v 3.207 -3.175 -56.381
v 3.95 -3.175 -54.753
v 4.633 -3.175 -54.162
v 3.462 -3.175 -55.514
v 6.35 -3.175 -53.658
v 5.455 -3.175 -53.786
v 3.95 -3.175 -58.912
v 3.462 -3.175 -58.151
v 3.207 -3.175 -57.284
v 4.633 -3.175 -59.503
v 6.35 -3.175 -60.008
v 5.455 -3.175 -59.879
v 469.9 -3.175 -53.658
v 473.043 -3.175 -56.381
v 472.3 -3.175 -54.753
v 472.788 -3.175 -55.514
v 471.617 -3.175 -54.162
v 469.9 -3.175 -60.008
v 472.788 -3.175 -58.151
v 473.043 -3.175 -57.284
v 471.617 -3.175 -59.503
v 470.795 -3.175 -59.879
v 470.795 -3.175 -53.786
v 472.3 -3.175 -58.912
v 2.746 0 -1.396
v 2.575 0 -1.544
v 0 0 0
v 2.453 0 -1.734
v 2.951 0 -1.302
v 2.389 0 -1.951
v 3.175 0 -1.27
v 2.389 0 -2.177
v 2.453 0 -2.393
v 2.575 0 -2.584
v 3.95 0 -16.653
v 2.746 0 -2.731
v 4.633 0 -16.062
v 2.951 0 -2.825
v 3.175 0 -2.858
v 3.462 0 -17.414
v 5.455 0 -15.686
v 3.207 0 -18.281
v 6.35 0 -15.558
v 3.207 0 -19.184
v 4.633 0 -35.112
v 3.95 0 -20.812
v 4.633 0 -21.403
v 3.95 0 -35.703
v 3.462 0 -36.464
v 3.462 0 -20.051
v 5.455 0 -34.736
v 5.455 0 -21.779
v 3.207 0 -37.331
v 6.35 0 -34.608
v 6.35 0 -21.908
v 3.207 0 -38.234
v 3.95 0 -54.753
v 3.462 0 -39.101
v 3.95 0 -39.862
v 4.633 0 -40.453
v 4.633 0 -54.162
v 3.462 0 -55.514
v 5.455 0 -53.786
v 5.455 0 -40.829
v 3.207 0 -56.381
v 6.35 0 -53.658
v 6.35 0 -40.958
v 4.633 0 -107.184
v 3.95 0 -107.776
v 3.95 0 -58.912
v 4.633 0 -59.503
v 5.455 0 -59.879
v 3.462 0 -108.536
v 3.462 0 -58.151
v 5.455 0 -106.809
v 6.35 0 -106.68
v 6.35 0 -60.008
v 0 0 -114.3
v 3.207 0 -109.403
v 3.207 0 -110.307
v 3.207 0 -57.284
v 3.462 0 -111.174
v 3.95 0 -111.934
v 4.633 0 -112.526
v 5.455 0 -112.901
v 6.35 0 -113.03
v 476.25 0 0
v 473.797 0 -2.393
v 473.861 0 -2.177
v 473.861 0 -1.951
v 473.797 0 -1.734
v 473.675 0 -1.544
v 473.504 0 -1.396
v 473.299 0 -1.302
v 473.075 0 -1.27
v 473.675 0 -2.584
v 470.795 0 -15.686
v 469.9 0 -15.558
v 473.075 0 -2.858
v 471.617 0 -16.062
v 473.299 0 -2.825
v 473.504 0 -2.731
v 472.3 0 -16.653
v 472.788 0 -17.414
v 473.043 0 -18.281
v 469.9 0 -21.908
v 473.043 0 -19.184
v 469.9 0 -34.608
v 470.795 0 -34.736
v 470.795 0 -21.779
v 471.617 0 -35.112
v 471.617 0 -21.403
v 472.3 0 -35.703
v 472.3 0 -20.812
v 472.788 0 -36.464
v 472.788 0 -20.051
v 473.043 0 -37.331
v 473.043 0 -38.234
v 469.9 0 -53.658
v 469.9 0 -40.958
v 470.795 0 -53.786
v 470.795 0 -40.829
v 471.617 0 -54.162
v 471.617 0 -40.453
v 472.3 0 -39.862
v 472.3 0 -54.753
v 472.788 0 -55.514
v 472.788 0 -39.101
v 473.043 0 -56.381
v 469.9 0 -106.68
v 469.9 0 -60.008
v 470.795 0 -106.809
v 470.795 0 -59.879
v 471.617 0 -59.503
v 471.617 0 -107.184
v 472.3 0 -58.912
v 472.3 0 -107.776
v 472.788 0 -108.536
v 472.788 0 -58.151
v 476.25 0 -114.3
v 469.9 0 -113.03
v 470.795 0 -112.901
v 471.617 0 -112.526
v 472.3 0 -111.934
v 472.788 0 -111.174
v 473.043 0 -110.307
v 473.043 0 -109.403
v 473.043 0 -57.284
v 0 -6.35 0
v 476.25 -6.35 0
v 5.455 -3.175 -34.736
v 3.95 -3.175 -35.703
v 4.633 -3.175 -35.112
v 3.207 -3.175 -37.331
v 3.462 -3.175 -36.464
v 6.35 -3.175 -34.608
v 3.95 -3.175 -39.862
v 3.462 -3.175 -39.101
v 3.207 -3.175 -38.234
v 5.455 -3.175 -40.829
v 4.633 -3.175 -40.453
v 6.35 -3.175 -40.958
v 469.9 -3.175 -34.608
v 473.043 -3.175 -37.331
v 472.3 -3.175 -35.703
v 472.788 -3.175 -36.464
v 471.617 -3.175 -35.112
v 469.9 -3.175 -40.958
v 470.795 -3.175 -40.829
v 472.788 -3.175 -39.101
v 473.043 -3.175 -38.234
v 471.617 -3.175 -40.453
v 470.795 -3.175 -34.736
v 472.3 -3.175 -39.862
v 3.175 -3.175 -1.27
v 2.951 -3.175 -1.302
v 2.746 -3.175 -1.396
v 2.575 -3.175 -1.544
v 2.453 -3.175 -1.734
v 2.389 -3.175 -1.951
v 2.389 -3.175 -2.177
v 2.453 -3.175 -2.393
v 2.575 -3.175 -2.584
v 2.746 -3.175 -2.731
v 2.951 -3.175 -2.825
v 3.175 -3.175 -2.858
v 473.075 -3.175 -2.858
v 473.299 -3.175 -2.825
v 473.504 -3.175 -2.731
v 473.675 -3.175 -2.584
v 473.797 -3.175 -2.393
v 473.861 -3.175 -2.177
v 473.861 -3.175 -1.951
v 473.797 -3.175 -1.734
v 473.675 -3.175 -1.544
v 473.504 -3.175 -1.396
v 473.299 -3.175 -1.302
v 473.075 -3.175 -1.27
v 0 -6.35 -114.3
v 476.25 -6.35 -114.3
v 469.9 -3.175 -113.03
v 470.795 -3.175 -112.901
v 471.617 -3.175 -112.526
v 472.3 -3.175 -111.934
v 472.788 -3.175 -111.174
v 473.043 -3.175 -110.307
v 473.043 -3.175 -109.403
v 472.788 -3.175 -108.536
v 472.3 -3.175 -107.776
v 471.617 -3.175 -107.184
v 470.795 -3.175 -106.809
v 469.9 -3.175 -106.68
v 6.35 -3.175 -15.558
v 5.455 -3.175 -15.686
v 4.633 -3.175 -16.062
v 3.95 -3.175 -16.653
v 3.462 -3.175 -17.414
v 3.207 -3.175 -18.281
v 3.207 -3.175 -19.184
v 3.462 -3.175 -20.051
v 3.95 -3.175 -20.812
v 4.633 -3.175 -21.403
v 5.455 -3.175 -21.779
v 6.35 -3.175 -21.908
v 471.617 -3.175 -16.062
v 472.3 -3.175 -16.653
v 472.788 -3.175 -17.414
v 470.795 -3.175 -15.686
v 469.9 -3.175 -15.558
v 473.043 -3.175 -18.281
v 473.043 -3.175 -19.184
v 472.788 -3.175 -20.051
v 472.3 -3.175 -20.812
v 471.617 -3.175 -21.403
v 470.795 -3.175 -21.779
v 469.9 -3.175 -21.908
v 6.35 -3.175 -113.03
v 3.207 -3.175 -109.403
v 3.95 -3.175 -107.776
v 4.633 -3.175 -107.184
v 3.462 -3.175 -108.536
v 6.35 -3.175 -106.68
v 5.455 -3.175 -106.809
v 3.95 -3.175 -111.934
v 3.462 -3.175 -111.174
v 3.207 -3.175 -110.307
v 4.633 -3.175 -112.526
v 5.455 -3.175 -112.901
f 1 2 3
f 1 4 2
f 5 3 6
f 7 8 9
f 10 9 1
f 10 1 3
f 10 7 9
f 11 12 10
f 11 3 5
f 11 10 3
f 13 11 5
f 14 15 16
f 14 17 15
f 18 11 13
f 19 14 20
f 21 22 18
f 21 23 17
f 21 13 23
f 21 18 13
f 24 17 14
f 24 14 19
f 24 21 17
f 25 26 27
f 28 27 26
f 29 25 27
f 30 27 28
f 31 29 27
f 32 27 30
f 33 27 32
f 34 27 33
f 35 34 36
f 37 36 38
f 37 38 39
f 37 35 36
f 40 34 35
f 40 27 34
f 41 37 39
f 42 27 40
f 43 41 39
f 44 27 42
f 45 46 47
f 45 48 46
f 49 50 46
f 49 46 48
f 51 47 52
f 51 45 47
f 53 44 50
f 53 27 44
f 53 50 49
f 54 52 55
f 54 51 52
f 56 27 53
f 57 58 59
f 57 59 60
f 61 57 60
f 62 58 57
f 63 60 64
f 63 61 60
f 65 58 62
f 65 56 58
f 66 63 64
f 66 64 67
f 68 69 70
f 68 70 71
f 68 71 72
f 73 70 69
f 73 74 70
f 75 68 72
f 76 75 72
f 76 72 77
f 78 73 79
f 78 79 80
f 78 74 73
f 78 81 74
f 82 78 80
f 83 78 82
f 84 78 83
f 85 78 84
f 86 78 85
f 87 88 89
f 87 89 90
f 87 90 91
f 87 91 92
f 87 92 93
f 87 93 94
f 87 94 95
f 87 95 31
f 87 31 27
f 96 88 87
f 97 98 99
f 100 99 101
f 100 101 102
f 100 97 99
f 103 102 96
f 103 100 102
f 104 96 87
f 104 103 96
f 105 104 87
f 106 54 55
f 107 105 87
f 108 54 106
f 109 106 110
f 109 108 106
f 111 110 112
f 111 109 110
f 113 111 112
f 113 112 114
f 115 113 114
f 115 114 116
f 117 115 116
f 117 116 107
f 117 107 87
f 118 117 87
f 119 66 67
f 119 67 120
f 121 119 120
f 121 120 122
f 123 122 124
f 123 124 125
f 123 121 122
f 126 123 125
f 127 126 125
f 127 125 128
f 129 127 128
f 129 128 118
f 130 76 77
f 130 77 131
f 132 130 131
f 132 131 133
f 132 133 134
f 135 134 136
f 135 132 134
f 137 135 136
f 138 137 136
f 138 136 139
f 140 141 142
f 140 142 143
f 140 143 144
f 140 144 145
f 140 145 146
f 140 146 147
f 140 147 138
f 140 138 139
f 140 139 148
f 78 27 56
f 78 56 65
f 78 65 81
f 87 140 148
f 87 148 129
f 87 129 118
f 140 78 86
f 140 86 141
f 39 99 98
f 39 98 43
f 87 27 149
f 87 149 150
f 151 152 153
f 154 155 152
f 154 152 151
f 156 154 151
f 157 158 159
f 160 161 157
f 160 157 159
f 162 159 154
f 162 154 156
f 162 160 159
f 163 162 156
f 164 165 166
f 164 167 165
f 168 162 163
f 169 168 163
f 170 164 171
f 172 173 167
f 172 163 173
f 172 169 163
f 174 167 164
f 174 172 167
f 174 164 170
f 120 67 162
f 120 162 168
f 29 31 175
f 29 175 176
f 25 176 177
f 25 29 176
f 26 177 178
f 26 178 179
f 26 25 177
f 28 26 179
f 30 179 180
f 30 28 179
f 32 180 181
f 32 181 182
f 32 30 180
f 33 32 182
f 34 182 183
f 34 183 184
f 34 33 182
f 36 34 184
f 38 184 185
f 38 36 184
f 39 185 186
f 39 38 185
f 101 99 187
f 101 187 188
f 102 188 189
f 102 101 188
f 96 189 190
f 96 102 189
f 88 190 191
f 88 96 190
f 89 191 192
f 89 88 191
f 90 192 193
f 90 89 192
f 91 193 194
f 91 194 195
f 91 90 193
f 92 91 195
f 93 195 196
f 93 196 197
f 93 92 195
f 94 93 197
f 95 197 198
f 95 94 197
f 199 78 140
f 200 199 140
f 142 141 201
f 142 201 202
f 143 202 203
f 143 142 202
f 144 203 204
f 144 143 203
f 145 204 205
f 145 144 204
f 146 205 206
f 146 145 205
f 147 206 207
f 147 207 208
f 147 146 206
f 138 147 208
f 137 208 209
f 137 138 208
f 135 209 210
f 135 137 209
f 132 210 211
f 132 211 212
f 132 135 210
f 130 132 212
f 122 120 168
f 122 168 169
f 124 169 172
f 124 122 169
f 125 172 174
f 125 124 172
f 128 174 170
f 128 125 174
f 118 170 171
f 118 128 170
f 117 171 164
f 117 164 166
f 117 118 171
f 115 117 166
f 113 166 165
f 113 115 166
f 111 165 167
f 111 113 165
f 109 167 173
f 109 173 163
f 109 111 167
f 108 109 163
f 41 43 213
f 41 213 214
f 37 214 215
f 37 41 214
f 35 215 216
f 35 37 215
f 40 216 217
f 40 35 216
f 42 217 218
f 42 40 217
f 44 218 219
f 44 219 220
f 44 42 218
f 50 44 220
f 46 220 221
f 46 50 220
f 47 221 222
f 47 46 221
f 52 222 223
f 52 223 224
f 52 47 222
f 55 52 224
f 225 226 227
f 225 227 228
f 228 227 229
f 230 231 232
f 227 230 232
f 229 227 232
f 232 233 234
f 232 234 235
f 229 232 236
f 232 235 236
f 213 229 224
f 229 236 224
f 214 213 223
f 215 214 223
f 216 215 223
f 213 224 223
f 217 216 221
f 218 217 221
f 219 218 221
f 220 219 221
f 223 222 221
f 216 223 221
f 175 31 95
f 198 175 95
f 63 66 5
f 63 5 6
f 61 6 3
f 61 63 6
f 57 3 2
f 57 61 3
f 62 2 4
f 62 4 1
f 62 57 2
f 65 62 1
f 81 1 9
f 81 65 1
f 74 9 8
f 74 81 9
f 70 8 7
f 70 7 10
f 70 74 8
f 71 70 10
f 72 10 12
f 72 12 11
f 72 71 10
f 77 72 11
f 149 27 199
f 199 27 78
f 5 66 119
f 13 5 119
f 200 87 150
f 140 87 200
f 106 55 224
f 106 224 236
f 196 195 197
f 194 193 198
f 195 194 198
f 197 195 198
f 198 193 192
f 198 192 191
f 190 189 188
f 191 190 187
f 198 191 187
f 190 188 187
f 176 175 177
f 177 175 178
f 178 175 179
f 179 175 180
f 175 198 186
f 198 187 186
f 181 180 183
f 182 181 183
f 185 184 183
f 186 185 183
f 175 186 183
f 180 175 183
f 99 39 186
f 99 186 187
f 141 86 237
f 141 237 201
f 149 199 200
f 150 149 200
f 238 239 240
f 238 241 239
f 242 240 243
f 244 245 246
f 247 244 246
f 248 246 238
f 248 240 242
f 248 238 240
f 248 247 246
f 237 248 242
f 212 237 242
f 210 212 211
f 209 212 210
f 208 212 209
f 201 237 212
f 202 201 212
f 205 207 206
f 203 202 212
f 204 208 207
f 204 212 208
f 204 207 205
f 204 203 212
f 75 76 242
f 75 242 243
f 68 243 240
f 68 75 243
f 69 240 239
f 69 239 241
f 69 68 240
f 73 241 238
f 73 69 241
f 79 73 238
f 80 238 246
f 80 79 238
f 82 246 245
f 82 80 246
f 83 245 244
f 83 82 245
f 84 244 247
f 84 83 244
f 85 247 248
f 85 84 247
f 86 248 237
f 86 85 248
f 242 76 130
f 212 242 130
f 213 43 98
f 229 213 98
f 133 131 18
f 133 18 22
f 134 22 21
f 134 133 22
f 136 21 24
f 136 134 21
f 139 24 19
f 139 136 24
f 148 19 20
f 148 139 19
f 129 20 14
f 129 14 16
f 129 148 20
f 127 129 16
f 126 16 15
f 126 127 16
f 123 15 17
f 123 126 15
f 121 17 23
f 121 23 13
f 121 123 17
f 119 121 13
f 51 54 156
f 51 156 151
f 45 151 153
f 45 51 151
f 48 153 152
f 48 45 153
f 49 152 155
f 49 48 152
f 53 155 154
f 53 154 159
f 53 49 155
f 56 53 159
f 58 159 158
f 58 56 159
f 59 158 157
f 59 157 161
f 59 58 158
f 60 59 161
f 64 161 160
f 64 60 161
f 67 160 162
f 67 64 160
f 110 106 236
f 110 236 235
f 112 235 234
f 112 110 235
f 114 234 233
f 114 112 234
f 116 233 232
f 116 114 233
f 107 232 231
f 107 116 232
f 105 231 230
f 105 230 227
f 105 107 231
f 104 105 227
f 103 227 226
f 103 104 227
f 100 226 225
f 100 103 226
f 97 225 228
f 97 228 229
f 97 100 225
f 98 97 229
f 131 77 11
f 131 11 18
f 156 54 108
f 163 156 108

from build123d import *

# Parameters (mm, degrees)
SKETCH1_W           = 476.25
SKETCH1_H           = 114.3
BOSS_EXTRUDE1_DEPTH = 6.35
CUT_EXTRUDE1_DEPTH  = 3.175
SKETCH2_3_W         = 463.55
SKETCH2_3_H         = 6.35
SKETCH2_3_W_2       = 469.9
SKETCH2_3_H_2       = 1.5875
CUT_EXTRUDE2_DEPTH  = 3.175


with BuildPart() as part:
    # Sketch1 → Boss-Extrude1 (new body)
    with BuildSketch(Plane(origin=(0, 0, 0), x_dir=(1, 0, 0), z_dir=(0, 1, 0))):
        with Locations((238.125, 57.15)):
            Rectangle(SKETCH1_W, SKETCH1_H)
    extrude(amount=-BOSS_EXTRUDE1_DEPTH)

    # Sketch2 → Cut-Extrude1 (cut)
    with BuildSketch(Plane(origin=(0, 0, 0), x_dir=(1, 0, 0), z_dir=(0, 1, 0))):
        with BuildLine():
            Line((6.35, 15.5575), (6.35, 21.9075))
            ThreePointArc((6.35, 21.9075), (3.175, 18.7325), (6.35, 15.5575))
        make_face()
        with BuildLine():
            ThreePointArc((469.9, 15.5575), (473.075, 18.7325), (469.9, 21.9075))
            Line((469.9, 21.9075), (469.9, 15.5575))
        make_face()
        with BuildLine():
            Line((469.9, 40.9575), (6.35, 40.9575))
            ThreePointArc((6.35, 40.9575), (3.175, 37.7825), (6.35, 34.6075))
            Line((6.35, 34.6075), (469.9, 34.6075))
            ThreePointArc((469.9, 34.6075), (473.075, 37.7825), (469.9, 40.9575))
        make_face()
        with BuildLine():
            Line((469.9, 60.0075), (6.35, 60.0075))
            ThreePointArc((6.35, 60.0075), (3.175, 56.8325), (6.35, 53.6575))
            Line((6.35, 53.6575), (469.9, 53.6575))
            ThreePointArc((469.9, 53.6575), (473.075, 56.8325), (469.9, 60.0075))
        make_face()
        with BuildLine():
            Line((3.175, 1.27), (3.175, 2.8575))
            ThreePointArc((3.175, 2.8575), (2.38125, 2.06375), (3.175, 1.27))
        make_face()
        with BuildLine():
            ThreePointArc((473.075, 1.27), (473.86875, 2.06375), (473.075, 2.8575))
            Line((473.075, 2.8575), (473.075, 1.27))
        make_face()
        with BuildLine():
            Line((469.9, 113.03), (6.35, 113.03))
            ThreePointArc((6.35, 113.03), (3.175, 109.855), (6.35, 106.68))
            Line((6.35, 106.68), (469.9, 106.68))
            ThreePointArc((469.9, 106.68), (473.075, 109.855), (469.9, 113.03))
        make_face()
    extrude(amount=-CUT_EXTRUDE1_DEPTH, mode=Mode.SUBTRACT)

    # Sketch2<3> → Cut-Extrude2 (cut)
    with BuildSketch(Plane(origin=(0, 0, 0), x_dir=(1, 0, 0), z_dir=(0, 1, 0))):
        with Locations((238.125, 18.7325)):
            Rectangle(SKETCH2_3_W, SKETCH2_3_H)
        with Locations((238.125, 2.06375)):
            Rectangle(SKETCH2_3_W_2, SKETCH2_3_H_2)
    extrude(amount=-CUT_EXTRUDE2_DEPTH, mode=Mode.SUBTRACT)


solid = part.part
